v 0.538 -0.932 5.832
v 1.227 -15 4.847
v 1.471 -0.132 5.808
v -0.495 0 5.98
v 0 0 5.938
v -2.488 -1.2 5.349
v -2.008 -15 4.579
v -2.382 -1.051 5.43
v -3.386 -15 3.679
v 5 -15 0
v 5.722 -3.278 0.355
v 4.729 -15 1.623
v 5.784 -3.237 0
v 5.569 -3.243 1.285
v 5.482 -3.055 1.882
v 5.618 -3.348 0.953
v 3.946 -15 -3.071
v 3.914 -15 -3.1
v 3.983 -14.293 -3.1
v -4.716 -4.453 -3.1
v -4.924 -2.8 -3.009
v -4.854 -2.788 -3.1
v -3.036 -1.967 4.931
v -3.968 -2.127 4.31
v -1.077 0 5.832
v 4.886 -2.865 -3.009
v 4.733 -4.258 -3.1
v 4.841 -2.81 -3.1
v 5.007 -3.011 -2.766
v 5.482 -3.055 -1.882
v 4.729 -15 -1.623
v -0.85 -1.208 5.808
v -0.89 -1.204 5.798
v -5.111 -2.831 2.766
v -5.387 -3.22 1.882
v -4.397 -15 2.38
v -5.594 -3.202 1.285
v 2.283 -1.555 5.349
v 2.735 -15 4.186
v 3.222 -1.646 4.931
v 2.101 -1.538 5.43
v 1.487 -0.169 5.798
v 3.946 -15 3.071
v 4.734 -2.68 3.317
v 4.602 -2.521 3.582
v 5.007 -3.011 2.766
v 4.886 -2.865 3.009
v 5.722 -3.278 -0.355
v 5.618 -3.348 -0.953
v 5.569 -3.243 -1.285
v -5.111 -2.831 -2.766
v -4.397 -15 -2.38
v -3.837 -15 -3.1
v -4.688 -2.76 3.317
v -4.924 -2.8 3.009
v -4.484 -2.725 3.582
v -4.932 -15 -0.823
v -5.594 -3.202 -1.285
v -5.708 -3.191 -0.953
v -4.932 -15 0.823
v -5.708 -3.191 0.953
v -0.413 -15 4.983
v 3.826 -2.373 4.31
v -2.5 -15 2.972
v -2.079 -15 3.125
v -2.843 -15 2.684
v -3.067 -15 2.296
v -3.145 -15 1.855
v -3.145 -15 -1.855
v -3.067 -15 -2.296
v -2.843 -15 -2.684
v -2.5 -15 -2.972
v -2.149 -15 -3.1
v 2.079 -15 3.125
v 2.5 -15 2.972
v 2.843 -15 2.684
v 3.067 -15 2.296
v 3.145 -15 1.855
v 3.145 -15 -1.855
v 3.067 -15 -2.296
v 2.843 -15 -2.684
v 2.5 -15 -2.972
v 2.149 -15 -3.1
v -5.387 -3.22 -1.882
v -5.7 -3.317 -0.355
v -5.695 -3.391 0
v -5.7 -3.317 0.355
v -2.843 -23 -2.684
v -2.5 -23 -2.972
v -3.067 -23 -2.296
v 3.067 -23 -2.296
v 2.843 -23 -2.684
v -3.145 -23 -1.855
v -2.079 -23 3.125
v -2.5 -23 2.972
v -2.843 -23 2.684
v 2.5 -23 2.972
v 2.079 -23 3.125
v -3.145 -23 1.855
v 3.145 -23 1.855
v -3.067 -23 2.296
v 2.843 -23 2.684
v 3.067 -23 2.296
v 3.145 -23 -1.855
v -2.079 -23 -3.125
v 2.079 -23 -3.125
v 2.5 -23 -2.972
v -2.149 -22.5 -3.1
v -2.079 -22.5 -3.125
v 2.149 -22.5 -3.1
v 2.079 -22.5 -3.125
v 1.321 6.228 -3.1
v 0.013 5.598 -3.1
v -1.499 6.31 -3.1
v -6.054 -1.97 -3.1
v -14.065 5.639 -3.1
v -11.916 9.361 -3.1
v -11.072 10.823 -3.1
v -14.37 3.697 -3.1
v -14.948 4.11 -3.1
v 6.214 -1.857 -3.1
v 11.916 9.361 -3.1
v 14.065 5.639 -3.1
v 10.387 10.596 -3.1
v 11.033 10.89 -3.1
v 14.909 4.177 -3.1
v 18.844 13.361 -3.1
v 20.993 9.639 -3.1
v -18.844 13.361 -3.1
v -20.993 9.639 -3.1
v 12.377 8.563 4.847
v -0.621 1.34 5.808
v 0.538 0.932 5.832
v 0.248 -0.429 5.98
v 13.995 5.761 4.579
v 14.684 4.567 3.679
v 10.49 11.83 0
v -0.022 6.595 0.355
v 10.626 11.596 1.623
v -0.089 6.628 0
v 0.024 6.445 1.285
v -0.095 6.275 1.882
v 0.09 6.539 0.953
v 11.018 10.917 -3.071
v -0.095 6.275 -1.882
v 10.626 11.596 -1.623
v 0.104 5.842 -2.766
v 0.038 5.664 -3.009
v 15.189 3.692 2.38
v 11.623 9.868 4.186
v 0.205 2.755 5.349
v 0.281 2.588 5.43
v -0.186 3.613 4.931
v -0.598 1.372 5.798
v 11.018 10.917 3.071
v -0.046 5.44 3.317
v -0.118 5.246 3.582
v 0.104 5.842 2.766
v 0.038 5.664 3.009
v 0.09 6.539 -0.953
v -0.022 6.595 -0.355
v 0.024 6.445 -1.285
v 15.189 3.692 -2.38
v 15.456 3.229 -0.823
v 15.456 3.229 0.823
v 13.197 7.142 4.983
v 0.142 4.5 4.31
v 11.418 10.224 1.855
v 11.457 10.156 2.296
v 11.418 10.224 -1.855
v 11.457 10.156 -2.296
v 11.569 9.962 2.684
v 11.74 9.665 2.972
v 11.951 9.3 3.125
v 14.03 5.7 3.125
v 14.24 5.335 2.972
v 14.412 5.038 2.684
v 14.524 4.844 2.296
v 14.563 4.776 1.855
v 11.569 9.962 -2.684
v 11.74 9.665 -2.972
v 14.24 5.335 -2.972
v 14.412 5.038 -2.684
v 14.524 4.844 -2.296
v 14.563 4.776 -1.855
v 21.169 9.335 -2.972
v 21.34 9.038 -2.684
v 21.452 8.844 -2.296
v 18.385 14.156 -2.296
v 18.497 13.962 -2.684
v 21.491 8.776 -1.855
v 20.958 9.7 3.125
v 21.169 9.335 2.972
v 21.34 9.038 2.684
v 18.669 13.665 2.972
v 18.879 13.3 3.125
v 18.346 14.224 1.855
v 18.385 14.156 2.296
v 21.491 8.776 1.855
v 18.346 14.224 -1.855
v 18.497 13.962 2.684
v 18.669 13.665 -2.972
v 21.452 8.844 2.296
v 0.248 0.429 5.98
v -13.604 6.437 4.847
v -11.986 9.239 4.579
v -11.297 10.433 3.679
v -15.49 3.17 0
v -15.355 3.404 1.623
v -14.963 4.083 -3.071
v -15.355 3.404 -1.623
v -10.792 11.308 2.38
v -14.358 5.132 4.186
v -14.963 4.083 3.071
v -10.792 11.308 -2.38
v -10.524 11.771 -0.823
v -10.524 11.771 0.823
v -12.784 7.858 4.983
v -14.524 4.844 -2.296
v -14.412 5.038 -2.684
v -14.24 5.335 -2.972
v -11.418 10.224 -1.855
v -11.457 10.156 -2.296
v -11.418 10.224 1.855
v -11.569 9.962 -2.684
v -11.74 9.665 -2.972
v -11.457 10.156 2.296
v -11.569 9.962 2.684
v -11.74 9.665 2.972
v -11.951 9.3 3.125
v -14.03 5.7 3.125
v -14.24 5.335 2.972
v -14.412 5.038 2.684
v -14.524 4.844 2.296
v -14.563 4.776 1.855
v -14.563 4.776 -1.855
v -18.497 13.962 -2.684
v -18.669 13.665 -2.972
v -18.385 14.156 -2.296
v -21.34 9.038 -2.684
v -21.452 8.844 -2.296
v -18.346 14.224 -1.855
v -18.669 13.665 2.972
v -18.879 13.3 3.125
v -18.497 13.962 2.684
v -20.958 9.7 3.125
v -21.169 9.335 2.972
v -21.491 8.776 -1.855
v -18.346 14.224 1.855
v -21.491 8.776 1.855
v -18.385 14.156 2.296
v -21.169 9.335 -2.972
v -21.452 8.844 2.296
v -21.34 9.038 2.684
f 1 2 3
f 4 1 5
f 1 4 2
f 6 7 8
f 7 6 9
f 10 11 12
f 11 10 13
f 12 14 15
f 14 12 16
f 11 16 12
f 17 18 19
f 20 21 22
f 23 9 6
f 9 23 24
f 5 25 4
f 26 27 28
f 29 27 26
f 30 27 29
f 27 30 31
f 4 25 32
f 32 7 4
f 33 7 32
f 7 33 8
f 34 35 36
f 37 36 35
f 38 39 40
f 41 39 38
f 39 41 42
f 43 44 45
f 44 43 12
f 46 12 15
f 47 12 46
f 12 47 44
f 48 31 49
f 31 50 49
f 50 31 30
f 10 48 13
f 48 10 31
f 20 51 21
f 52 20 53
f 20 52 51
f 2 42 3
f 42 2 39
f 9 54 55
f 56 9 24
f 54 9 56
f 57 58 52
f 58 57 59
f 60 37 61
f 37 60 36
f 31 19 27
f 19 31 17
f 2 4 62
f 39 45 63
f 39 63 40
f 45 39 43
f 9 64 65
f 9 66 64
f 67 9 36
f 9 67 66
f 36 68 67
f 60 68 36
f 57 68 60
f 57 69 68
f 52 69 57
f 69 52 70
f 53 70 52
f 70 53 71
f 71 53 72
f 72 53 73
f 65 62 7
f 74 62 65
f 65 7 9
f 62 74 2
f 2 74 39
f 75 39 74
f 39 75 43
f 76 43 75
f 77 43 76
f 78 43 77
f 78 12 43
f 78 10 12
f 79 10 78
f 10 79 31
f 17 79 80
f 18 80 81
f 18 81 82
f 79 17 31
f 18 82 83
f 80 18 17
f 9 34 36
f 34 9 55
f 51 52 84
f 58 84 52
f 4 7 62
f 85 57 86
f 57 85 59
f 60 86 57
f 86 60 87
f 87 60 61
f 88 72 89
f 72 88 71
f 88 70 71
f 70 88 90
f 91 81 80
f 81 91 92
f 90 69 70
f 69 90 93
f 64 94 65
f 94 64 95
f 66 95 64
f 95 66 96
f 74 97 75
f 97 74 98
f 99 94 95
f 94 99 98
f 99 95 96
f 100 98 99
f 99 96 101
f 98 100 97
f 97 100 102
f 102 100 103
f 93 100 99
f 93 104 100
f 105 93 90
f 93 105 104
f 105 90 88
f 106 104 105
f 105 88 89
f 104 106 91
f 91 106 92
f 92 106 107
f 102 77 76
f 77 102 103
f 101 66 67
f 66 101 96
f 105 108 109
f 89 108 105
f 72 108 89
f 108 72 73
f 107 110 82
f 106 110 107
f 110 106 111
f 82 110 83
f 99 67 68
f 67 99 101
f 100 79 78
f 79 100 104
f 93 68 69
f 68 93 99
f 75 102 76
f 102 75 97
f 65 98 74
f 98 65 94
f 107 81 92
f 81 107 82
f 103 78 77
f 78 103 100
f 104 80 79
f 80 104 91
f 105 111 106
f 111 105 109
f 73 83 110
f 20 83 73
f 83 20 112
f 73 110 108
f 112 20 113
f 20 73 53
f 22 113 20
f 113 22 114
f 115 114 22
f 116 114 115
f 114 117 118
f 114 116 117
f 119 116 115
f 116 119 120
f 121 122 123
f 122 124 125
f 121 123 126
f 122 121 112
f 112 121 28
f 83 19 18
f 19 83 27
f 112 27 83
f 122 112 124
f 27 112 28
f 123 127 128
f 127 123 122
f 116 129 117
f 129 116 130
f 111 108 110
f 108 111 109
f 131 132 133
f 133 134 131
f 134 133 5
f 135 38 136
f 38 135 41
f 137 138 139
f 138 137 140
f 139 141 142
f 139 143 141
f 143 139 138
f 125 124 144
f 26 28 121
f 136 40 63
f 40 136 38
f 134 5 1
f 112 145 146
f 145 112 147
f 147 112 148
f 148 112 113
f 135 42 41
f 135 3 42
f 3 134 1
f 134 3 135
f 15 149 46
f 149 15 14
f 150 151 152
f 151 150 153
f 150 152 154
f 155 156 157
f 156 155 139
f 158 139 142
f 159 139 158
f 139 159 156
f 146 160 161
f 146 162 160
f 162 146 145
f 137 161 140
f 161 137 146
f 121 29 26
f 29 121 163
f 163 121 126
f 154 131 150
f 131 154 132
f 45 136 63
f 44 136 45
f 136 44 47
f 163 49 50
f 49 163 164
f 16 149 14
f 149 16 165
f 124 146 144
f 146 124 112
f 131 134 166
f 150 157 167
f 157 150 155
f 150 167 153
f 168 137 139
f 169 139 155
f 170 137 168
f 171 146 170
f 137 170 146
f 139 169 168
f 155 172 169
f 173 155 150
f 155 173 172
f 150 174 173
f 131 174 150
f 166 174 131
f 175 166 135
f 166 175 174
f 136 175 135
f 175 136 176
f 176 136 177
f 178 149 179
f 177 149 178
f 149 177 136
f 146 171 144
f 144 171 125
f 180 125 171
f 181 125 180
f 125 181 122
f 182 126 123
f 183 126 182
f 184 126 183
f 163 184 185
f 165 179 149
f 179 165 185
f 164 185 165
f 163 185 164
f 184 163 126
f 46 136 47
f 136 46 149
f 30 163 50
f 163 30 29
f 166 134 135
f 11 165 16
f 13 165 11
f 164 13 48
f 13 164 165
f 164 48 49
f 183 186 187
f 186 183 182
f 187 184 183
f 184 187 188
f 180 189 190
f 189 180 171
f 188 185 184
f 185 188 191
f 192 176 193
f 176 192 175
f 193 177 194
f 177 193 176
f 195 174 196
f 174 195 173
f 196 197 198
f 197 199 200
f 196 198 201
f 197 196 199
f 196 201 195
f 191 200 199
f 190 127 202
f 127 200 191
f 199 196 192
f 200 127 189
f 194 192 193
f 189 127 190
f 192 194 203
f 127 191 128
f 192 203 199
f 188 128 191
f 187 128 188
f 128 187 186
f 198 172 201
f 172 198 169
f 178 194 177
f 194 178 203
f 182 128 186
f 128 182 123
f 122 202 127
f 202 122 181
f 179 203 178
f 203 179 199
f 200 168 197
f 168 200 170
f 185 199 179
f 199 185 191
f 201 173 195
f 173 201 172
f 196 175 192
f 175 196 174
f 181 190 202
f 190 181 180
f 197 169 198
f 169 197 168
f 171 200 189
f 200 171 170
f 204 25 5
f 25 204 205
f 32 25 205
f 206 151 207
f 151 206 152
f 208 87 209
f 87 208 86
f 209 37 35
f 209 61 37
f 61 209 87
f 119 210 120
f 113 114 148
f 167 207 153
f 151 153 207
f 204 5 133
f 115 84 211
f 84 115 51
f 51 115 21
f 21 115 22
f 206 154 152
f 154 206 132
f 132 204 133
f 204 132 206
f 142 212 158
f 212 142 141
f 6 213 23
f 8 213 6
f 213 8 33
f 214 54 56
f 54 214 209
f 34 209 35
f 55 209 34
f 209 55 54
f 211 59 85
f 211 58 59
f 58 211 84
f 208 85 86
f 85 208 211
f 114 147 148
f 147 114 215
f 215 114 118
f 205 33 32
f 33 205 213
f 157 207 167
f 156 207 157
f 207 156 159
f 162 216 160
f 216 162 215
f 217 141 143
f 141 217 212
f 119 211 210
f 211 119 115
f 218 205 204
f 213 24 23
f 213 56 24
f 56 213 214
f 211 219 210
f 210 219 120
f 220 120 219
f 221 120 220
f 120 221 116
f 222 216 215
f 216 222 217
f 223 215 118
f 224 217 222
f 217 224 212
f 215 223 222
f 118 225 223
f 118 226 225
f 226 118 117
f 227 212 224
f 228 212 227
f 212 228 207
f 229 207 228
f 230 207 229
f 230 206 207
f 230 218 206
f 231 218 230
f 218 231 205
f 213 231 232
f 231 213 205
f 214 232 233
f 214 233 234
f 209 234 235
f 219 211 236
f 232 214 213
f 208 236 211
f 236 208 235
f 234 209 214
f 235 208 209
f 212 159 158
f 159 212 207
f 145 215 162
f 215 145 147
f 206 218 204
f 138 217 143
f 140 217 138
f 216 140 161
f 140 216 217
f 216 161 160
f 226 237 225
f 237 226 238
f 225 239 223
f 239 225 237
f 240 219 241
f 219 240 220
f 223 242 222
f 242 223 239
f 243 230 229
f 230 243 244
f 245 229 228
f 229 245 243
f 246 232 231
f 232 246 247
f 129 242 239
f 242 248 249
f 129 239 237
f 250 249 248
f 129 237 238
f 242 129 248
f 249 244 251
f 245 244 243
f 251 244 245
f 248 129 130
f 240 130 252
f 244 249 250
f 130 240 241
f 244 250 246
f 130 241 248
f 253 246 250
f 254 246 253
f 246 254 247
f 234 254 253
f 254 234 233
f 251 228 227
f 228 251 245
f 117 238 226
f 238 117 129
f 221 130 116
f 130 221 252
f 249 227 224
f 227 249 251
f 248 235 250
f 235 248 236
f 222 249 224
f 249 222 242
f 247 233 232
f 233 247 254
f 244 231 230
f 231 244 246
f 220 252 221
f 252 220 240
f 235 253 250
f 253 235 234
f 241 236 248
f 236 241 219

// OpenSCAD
// Number of wrench head
wrenchCount = 3; //[3,4,5,6]

// Length of wrench hand
wrenchLength = 15; //[10:50]


multiWrench(wrenchCount,wrenchLength);

module multiWrench(count,length){
    for(degree=[0:360/count:359]){
        union(){
            echo(degree);
            wrenchBranch(length,degree);
        }
    }
}
module wrenchBranch(length,degree){
    difference(){
        rotate([90,0,degree]) {
            translate([0,0,length/2]) {
                cylinder(length, 6,5, center=true);
                translate([0,0,length/2]) {
                    roundedRect([5, 5, 8], 1.29, $fn=18);
                }
            }
        }
        translate([0,0,-5.1]){
            cube([length*3,length*3,4],center=true);
        }
    }
}

module roundedRect(size, radius)
{
	x = size[0];
	y = size[1];
	z = size[2];

	linear_extrude(height=z)
	hull()
	{
		// place 4 circles in the corners, with the given radius
		translate([(-x/2)+(radius/2), (-y/2)+(radius/2), 0])
		circle(r=radius);
	
		translate([(x/2)-(radius/2), (-y/2)+(radius/2), 0])
		circle(r=radius);
	
		translate([(-x/2)+(radius/2), (y/2)-(radius/2), 0])
		circle(r=radius);
	
		translate([(x/2)-(radius/2), (y/2)-(radius/2), 0])
		circle(r=radius);
	}
}
